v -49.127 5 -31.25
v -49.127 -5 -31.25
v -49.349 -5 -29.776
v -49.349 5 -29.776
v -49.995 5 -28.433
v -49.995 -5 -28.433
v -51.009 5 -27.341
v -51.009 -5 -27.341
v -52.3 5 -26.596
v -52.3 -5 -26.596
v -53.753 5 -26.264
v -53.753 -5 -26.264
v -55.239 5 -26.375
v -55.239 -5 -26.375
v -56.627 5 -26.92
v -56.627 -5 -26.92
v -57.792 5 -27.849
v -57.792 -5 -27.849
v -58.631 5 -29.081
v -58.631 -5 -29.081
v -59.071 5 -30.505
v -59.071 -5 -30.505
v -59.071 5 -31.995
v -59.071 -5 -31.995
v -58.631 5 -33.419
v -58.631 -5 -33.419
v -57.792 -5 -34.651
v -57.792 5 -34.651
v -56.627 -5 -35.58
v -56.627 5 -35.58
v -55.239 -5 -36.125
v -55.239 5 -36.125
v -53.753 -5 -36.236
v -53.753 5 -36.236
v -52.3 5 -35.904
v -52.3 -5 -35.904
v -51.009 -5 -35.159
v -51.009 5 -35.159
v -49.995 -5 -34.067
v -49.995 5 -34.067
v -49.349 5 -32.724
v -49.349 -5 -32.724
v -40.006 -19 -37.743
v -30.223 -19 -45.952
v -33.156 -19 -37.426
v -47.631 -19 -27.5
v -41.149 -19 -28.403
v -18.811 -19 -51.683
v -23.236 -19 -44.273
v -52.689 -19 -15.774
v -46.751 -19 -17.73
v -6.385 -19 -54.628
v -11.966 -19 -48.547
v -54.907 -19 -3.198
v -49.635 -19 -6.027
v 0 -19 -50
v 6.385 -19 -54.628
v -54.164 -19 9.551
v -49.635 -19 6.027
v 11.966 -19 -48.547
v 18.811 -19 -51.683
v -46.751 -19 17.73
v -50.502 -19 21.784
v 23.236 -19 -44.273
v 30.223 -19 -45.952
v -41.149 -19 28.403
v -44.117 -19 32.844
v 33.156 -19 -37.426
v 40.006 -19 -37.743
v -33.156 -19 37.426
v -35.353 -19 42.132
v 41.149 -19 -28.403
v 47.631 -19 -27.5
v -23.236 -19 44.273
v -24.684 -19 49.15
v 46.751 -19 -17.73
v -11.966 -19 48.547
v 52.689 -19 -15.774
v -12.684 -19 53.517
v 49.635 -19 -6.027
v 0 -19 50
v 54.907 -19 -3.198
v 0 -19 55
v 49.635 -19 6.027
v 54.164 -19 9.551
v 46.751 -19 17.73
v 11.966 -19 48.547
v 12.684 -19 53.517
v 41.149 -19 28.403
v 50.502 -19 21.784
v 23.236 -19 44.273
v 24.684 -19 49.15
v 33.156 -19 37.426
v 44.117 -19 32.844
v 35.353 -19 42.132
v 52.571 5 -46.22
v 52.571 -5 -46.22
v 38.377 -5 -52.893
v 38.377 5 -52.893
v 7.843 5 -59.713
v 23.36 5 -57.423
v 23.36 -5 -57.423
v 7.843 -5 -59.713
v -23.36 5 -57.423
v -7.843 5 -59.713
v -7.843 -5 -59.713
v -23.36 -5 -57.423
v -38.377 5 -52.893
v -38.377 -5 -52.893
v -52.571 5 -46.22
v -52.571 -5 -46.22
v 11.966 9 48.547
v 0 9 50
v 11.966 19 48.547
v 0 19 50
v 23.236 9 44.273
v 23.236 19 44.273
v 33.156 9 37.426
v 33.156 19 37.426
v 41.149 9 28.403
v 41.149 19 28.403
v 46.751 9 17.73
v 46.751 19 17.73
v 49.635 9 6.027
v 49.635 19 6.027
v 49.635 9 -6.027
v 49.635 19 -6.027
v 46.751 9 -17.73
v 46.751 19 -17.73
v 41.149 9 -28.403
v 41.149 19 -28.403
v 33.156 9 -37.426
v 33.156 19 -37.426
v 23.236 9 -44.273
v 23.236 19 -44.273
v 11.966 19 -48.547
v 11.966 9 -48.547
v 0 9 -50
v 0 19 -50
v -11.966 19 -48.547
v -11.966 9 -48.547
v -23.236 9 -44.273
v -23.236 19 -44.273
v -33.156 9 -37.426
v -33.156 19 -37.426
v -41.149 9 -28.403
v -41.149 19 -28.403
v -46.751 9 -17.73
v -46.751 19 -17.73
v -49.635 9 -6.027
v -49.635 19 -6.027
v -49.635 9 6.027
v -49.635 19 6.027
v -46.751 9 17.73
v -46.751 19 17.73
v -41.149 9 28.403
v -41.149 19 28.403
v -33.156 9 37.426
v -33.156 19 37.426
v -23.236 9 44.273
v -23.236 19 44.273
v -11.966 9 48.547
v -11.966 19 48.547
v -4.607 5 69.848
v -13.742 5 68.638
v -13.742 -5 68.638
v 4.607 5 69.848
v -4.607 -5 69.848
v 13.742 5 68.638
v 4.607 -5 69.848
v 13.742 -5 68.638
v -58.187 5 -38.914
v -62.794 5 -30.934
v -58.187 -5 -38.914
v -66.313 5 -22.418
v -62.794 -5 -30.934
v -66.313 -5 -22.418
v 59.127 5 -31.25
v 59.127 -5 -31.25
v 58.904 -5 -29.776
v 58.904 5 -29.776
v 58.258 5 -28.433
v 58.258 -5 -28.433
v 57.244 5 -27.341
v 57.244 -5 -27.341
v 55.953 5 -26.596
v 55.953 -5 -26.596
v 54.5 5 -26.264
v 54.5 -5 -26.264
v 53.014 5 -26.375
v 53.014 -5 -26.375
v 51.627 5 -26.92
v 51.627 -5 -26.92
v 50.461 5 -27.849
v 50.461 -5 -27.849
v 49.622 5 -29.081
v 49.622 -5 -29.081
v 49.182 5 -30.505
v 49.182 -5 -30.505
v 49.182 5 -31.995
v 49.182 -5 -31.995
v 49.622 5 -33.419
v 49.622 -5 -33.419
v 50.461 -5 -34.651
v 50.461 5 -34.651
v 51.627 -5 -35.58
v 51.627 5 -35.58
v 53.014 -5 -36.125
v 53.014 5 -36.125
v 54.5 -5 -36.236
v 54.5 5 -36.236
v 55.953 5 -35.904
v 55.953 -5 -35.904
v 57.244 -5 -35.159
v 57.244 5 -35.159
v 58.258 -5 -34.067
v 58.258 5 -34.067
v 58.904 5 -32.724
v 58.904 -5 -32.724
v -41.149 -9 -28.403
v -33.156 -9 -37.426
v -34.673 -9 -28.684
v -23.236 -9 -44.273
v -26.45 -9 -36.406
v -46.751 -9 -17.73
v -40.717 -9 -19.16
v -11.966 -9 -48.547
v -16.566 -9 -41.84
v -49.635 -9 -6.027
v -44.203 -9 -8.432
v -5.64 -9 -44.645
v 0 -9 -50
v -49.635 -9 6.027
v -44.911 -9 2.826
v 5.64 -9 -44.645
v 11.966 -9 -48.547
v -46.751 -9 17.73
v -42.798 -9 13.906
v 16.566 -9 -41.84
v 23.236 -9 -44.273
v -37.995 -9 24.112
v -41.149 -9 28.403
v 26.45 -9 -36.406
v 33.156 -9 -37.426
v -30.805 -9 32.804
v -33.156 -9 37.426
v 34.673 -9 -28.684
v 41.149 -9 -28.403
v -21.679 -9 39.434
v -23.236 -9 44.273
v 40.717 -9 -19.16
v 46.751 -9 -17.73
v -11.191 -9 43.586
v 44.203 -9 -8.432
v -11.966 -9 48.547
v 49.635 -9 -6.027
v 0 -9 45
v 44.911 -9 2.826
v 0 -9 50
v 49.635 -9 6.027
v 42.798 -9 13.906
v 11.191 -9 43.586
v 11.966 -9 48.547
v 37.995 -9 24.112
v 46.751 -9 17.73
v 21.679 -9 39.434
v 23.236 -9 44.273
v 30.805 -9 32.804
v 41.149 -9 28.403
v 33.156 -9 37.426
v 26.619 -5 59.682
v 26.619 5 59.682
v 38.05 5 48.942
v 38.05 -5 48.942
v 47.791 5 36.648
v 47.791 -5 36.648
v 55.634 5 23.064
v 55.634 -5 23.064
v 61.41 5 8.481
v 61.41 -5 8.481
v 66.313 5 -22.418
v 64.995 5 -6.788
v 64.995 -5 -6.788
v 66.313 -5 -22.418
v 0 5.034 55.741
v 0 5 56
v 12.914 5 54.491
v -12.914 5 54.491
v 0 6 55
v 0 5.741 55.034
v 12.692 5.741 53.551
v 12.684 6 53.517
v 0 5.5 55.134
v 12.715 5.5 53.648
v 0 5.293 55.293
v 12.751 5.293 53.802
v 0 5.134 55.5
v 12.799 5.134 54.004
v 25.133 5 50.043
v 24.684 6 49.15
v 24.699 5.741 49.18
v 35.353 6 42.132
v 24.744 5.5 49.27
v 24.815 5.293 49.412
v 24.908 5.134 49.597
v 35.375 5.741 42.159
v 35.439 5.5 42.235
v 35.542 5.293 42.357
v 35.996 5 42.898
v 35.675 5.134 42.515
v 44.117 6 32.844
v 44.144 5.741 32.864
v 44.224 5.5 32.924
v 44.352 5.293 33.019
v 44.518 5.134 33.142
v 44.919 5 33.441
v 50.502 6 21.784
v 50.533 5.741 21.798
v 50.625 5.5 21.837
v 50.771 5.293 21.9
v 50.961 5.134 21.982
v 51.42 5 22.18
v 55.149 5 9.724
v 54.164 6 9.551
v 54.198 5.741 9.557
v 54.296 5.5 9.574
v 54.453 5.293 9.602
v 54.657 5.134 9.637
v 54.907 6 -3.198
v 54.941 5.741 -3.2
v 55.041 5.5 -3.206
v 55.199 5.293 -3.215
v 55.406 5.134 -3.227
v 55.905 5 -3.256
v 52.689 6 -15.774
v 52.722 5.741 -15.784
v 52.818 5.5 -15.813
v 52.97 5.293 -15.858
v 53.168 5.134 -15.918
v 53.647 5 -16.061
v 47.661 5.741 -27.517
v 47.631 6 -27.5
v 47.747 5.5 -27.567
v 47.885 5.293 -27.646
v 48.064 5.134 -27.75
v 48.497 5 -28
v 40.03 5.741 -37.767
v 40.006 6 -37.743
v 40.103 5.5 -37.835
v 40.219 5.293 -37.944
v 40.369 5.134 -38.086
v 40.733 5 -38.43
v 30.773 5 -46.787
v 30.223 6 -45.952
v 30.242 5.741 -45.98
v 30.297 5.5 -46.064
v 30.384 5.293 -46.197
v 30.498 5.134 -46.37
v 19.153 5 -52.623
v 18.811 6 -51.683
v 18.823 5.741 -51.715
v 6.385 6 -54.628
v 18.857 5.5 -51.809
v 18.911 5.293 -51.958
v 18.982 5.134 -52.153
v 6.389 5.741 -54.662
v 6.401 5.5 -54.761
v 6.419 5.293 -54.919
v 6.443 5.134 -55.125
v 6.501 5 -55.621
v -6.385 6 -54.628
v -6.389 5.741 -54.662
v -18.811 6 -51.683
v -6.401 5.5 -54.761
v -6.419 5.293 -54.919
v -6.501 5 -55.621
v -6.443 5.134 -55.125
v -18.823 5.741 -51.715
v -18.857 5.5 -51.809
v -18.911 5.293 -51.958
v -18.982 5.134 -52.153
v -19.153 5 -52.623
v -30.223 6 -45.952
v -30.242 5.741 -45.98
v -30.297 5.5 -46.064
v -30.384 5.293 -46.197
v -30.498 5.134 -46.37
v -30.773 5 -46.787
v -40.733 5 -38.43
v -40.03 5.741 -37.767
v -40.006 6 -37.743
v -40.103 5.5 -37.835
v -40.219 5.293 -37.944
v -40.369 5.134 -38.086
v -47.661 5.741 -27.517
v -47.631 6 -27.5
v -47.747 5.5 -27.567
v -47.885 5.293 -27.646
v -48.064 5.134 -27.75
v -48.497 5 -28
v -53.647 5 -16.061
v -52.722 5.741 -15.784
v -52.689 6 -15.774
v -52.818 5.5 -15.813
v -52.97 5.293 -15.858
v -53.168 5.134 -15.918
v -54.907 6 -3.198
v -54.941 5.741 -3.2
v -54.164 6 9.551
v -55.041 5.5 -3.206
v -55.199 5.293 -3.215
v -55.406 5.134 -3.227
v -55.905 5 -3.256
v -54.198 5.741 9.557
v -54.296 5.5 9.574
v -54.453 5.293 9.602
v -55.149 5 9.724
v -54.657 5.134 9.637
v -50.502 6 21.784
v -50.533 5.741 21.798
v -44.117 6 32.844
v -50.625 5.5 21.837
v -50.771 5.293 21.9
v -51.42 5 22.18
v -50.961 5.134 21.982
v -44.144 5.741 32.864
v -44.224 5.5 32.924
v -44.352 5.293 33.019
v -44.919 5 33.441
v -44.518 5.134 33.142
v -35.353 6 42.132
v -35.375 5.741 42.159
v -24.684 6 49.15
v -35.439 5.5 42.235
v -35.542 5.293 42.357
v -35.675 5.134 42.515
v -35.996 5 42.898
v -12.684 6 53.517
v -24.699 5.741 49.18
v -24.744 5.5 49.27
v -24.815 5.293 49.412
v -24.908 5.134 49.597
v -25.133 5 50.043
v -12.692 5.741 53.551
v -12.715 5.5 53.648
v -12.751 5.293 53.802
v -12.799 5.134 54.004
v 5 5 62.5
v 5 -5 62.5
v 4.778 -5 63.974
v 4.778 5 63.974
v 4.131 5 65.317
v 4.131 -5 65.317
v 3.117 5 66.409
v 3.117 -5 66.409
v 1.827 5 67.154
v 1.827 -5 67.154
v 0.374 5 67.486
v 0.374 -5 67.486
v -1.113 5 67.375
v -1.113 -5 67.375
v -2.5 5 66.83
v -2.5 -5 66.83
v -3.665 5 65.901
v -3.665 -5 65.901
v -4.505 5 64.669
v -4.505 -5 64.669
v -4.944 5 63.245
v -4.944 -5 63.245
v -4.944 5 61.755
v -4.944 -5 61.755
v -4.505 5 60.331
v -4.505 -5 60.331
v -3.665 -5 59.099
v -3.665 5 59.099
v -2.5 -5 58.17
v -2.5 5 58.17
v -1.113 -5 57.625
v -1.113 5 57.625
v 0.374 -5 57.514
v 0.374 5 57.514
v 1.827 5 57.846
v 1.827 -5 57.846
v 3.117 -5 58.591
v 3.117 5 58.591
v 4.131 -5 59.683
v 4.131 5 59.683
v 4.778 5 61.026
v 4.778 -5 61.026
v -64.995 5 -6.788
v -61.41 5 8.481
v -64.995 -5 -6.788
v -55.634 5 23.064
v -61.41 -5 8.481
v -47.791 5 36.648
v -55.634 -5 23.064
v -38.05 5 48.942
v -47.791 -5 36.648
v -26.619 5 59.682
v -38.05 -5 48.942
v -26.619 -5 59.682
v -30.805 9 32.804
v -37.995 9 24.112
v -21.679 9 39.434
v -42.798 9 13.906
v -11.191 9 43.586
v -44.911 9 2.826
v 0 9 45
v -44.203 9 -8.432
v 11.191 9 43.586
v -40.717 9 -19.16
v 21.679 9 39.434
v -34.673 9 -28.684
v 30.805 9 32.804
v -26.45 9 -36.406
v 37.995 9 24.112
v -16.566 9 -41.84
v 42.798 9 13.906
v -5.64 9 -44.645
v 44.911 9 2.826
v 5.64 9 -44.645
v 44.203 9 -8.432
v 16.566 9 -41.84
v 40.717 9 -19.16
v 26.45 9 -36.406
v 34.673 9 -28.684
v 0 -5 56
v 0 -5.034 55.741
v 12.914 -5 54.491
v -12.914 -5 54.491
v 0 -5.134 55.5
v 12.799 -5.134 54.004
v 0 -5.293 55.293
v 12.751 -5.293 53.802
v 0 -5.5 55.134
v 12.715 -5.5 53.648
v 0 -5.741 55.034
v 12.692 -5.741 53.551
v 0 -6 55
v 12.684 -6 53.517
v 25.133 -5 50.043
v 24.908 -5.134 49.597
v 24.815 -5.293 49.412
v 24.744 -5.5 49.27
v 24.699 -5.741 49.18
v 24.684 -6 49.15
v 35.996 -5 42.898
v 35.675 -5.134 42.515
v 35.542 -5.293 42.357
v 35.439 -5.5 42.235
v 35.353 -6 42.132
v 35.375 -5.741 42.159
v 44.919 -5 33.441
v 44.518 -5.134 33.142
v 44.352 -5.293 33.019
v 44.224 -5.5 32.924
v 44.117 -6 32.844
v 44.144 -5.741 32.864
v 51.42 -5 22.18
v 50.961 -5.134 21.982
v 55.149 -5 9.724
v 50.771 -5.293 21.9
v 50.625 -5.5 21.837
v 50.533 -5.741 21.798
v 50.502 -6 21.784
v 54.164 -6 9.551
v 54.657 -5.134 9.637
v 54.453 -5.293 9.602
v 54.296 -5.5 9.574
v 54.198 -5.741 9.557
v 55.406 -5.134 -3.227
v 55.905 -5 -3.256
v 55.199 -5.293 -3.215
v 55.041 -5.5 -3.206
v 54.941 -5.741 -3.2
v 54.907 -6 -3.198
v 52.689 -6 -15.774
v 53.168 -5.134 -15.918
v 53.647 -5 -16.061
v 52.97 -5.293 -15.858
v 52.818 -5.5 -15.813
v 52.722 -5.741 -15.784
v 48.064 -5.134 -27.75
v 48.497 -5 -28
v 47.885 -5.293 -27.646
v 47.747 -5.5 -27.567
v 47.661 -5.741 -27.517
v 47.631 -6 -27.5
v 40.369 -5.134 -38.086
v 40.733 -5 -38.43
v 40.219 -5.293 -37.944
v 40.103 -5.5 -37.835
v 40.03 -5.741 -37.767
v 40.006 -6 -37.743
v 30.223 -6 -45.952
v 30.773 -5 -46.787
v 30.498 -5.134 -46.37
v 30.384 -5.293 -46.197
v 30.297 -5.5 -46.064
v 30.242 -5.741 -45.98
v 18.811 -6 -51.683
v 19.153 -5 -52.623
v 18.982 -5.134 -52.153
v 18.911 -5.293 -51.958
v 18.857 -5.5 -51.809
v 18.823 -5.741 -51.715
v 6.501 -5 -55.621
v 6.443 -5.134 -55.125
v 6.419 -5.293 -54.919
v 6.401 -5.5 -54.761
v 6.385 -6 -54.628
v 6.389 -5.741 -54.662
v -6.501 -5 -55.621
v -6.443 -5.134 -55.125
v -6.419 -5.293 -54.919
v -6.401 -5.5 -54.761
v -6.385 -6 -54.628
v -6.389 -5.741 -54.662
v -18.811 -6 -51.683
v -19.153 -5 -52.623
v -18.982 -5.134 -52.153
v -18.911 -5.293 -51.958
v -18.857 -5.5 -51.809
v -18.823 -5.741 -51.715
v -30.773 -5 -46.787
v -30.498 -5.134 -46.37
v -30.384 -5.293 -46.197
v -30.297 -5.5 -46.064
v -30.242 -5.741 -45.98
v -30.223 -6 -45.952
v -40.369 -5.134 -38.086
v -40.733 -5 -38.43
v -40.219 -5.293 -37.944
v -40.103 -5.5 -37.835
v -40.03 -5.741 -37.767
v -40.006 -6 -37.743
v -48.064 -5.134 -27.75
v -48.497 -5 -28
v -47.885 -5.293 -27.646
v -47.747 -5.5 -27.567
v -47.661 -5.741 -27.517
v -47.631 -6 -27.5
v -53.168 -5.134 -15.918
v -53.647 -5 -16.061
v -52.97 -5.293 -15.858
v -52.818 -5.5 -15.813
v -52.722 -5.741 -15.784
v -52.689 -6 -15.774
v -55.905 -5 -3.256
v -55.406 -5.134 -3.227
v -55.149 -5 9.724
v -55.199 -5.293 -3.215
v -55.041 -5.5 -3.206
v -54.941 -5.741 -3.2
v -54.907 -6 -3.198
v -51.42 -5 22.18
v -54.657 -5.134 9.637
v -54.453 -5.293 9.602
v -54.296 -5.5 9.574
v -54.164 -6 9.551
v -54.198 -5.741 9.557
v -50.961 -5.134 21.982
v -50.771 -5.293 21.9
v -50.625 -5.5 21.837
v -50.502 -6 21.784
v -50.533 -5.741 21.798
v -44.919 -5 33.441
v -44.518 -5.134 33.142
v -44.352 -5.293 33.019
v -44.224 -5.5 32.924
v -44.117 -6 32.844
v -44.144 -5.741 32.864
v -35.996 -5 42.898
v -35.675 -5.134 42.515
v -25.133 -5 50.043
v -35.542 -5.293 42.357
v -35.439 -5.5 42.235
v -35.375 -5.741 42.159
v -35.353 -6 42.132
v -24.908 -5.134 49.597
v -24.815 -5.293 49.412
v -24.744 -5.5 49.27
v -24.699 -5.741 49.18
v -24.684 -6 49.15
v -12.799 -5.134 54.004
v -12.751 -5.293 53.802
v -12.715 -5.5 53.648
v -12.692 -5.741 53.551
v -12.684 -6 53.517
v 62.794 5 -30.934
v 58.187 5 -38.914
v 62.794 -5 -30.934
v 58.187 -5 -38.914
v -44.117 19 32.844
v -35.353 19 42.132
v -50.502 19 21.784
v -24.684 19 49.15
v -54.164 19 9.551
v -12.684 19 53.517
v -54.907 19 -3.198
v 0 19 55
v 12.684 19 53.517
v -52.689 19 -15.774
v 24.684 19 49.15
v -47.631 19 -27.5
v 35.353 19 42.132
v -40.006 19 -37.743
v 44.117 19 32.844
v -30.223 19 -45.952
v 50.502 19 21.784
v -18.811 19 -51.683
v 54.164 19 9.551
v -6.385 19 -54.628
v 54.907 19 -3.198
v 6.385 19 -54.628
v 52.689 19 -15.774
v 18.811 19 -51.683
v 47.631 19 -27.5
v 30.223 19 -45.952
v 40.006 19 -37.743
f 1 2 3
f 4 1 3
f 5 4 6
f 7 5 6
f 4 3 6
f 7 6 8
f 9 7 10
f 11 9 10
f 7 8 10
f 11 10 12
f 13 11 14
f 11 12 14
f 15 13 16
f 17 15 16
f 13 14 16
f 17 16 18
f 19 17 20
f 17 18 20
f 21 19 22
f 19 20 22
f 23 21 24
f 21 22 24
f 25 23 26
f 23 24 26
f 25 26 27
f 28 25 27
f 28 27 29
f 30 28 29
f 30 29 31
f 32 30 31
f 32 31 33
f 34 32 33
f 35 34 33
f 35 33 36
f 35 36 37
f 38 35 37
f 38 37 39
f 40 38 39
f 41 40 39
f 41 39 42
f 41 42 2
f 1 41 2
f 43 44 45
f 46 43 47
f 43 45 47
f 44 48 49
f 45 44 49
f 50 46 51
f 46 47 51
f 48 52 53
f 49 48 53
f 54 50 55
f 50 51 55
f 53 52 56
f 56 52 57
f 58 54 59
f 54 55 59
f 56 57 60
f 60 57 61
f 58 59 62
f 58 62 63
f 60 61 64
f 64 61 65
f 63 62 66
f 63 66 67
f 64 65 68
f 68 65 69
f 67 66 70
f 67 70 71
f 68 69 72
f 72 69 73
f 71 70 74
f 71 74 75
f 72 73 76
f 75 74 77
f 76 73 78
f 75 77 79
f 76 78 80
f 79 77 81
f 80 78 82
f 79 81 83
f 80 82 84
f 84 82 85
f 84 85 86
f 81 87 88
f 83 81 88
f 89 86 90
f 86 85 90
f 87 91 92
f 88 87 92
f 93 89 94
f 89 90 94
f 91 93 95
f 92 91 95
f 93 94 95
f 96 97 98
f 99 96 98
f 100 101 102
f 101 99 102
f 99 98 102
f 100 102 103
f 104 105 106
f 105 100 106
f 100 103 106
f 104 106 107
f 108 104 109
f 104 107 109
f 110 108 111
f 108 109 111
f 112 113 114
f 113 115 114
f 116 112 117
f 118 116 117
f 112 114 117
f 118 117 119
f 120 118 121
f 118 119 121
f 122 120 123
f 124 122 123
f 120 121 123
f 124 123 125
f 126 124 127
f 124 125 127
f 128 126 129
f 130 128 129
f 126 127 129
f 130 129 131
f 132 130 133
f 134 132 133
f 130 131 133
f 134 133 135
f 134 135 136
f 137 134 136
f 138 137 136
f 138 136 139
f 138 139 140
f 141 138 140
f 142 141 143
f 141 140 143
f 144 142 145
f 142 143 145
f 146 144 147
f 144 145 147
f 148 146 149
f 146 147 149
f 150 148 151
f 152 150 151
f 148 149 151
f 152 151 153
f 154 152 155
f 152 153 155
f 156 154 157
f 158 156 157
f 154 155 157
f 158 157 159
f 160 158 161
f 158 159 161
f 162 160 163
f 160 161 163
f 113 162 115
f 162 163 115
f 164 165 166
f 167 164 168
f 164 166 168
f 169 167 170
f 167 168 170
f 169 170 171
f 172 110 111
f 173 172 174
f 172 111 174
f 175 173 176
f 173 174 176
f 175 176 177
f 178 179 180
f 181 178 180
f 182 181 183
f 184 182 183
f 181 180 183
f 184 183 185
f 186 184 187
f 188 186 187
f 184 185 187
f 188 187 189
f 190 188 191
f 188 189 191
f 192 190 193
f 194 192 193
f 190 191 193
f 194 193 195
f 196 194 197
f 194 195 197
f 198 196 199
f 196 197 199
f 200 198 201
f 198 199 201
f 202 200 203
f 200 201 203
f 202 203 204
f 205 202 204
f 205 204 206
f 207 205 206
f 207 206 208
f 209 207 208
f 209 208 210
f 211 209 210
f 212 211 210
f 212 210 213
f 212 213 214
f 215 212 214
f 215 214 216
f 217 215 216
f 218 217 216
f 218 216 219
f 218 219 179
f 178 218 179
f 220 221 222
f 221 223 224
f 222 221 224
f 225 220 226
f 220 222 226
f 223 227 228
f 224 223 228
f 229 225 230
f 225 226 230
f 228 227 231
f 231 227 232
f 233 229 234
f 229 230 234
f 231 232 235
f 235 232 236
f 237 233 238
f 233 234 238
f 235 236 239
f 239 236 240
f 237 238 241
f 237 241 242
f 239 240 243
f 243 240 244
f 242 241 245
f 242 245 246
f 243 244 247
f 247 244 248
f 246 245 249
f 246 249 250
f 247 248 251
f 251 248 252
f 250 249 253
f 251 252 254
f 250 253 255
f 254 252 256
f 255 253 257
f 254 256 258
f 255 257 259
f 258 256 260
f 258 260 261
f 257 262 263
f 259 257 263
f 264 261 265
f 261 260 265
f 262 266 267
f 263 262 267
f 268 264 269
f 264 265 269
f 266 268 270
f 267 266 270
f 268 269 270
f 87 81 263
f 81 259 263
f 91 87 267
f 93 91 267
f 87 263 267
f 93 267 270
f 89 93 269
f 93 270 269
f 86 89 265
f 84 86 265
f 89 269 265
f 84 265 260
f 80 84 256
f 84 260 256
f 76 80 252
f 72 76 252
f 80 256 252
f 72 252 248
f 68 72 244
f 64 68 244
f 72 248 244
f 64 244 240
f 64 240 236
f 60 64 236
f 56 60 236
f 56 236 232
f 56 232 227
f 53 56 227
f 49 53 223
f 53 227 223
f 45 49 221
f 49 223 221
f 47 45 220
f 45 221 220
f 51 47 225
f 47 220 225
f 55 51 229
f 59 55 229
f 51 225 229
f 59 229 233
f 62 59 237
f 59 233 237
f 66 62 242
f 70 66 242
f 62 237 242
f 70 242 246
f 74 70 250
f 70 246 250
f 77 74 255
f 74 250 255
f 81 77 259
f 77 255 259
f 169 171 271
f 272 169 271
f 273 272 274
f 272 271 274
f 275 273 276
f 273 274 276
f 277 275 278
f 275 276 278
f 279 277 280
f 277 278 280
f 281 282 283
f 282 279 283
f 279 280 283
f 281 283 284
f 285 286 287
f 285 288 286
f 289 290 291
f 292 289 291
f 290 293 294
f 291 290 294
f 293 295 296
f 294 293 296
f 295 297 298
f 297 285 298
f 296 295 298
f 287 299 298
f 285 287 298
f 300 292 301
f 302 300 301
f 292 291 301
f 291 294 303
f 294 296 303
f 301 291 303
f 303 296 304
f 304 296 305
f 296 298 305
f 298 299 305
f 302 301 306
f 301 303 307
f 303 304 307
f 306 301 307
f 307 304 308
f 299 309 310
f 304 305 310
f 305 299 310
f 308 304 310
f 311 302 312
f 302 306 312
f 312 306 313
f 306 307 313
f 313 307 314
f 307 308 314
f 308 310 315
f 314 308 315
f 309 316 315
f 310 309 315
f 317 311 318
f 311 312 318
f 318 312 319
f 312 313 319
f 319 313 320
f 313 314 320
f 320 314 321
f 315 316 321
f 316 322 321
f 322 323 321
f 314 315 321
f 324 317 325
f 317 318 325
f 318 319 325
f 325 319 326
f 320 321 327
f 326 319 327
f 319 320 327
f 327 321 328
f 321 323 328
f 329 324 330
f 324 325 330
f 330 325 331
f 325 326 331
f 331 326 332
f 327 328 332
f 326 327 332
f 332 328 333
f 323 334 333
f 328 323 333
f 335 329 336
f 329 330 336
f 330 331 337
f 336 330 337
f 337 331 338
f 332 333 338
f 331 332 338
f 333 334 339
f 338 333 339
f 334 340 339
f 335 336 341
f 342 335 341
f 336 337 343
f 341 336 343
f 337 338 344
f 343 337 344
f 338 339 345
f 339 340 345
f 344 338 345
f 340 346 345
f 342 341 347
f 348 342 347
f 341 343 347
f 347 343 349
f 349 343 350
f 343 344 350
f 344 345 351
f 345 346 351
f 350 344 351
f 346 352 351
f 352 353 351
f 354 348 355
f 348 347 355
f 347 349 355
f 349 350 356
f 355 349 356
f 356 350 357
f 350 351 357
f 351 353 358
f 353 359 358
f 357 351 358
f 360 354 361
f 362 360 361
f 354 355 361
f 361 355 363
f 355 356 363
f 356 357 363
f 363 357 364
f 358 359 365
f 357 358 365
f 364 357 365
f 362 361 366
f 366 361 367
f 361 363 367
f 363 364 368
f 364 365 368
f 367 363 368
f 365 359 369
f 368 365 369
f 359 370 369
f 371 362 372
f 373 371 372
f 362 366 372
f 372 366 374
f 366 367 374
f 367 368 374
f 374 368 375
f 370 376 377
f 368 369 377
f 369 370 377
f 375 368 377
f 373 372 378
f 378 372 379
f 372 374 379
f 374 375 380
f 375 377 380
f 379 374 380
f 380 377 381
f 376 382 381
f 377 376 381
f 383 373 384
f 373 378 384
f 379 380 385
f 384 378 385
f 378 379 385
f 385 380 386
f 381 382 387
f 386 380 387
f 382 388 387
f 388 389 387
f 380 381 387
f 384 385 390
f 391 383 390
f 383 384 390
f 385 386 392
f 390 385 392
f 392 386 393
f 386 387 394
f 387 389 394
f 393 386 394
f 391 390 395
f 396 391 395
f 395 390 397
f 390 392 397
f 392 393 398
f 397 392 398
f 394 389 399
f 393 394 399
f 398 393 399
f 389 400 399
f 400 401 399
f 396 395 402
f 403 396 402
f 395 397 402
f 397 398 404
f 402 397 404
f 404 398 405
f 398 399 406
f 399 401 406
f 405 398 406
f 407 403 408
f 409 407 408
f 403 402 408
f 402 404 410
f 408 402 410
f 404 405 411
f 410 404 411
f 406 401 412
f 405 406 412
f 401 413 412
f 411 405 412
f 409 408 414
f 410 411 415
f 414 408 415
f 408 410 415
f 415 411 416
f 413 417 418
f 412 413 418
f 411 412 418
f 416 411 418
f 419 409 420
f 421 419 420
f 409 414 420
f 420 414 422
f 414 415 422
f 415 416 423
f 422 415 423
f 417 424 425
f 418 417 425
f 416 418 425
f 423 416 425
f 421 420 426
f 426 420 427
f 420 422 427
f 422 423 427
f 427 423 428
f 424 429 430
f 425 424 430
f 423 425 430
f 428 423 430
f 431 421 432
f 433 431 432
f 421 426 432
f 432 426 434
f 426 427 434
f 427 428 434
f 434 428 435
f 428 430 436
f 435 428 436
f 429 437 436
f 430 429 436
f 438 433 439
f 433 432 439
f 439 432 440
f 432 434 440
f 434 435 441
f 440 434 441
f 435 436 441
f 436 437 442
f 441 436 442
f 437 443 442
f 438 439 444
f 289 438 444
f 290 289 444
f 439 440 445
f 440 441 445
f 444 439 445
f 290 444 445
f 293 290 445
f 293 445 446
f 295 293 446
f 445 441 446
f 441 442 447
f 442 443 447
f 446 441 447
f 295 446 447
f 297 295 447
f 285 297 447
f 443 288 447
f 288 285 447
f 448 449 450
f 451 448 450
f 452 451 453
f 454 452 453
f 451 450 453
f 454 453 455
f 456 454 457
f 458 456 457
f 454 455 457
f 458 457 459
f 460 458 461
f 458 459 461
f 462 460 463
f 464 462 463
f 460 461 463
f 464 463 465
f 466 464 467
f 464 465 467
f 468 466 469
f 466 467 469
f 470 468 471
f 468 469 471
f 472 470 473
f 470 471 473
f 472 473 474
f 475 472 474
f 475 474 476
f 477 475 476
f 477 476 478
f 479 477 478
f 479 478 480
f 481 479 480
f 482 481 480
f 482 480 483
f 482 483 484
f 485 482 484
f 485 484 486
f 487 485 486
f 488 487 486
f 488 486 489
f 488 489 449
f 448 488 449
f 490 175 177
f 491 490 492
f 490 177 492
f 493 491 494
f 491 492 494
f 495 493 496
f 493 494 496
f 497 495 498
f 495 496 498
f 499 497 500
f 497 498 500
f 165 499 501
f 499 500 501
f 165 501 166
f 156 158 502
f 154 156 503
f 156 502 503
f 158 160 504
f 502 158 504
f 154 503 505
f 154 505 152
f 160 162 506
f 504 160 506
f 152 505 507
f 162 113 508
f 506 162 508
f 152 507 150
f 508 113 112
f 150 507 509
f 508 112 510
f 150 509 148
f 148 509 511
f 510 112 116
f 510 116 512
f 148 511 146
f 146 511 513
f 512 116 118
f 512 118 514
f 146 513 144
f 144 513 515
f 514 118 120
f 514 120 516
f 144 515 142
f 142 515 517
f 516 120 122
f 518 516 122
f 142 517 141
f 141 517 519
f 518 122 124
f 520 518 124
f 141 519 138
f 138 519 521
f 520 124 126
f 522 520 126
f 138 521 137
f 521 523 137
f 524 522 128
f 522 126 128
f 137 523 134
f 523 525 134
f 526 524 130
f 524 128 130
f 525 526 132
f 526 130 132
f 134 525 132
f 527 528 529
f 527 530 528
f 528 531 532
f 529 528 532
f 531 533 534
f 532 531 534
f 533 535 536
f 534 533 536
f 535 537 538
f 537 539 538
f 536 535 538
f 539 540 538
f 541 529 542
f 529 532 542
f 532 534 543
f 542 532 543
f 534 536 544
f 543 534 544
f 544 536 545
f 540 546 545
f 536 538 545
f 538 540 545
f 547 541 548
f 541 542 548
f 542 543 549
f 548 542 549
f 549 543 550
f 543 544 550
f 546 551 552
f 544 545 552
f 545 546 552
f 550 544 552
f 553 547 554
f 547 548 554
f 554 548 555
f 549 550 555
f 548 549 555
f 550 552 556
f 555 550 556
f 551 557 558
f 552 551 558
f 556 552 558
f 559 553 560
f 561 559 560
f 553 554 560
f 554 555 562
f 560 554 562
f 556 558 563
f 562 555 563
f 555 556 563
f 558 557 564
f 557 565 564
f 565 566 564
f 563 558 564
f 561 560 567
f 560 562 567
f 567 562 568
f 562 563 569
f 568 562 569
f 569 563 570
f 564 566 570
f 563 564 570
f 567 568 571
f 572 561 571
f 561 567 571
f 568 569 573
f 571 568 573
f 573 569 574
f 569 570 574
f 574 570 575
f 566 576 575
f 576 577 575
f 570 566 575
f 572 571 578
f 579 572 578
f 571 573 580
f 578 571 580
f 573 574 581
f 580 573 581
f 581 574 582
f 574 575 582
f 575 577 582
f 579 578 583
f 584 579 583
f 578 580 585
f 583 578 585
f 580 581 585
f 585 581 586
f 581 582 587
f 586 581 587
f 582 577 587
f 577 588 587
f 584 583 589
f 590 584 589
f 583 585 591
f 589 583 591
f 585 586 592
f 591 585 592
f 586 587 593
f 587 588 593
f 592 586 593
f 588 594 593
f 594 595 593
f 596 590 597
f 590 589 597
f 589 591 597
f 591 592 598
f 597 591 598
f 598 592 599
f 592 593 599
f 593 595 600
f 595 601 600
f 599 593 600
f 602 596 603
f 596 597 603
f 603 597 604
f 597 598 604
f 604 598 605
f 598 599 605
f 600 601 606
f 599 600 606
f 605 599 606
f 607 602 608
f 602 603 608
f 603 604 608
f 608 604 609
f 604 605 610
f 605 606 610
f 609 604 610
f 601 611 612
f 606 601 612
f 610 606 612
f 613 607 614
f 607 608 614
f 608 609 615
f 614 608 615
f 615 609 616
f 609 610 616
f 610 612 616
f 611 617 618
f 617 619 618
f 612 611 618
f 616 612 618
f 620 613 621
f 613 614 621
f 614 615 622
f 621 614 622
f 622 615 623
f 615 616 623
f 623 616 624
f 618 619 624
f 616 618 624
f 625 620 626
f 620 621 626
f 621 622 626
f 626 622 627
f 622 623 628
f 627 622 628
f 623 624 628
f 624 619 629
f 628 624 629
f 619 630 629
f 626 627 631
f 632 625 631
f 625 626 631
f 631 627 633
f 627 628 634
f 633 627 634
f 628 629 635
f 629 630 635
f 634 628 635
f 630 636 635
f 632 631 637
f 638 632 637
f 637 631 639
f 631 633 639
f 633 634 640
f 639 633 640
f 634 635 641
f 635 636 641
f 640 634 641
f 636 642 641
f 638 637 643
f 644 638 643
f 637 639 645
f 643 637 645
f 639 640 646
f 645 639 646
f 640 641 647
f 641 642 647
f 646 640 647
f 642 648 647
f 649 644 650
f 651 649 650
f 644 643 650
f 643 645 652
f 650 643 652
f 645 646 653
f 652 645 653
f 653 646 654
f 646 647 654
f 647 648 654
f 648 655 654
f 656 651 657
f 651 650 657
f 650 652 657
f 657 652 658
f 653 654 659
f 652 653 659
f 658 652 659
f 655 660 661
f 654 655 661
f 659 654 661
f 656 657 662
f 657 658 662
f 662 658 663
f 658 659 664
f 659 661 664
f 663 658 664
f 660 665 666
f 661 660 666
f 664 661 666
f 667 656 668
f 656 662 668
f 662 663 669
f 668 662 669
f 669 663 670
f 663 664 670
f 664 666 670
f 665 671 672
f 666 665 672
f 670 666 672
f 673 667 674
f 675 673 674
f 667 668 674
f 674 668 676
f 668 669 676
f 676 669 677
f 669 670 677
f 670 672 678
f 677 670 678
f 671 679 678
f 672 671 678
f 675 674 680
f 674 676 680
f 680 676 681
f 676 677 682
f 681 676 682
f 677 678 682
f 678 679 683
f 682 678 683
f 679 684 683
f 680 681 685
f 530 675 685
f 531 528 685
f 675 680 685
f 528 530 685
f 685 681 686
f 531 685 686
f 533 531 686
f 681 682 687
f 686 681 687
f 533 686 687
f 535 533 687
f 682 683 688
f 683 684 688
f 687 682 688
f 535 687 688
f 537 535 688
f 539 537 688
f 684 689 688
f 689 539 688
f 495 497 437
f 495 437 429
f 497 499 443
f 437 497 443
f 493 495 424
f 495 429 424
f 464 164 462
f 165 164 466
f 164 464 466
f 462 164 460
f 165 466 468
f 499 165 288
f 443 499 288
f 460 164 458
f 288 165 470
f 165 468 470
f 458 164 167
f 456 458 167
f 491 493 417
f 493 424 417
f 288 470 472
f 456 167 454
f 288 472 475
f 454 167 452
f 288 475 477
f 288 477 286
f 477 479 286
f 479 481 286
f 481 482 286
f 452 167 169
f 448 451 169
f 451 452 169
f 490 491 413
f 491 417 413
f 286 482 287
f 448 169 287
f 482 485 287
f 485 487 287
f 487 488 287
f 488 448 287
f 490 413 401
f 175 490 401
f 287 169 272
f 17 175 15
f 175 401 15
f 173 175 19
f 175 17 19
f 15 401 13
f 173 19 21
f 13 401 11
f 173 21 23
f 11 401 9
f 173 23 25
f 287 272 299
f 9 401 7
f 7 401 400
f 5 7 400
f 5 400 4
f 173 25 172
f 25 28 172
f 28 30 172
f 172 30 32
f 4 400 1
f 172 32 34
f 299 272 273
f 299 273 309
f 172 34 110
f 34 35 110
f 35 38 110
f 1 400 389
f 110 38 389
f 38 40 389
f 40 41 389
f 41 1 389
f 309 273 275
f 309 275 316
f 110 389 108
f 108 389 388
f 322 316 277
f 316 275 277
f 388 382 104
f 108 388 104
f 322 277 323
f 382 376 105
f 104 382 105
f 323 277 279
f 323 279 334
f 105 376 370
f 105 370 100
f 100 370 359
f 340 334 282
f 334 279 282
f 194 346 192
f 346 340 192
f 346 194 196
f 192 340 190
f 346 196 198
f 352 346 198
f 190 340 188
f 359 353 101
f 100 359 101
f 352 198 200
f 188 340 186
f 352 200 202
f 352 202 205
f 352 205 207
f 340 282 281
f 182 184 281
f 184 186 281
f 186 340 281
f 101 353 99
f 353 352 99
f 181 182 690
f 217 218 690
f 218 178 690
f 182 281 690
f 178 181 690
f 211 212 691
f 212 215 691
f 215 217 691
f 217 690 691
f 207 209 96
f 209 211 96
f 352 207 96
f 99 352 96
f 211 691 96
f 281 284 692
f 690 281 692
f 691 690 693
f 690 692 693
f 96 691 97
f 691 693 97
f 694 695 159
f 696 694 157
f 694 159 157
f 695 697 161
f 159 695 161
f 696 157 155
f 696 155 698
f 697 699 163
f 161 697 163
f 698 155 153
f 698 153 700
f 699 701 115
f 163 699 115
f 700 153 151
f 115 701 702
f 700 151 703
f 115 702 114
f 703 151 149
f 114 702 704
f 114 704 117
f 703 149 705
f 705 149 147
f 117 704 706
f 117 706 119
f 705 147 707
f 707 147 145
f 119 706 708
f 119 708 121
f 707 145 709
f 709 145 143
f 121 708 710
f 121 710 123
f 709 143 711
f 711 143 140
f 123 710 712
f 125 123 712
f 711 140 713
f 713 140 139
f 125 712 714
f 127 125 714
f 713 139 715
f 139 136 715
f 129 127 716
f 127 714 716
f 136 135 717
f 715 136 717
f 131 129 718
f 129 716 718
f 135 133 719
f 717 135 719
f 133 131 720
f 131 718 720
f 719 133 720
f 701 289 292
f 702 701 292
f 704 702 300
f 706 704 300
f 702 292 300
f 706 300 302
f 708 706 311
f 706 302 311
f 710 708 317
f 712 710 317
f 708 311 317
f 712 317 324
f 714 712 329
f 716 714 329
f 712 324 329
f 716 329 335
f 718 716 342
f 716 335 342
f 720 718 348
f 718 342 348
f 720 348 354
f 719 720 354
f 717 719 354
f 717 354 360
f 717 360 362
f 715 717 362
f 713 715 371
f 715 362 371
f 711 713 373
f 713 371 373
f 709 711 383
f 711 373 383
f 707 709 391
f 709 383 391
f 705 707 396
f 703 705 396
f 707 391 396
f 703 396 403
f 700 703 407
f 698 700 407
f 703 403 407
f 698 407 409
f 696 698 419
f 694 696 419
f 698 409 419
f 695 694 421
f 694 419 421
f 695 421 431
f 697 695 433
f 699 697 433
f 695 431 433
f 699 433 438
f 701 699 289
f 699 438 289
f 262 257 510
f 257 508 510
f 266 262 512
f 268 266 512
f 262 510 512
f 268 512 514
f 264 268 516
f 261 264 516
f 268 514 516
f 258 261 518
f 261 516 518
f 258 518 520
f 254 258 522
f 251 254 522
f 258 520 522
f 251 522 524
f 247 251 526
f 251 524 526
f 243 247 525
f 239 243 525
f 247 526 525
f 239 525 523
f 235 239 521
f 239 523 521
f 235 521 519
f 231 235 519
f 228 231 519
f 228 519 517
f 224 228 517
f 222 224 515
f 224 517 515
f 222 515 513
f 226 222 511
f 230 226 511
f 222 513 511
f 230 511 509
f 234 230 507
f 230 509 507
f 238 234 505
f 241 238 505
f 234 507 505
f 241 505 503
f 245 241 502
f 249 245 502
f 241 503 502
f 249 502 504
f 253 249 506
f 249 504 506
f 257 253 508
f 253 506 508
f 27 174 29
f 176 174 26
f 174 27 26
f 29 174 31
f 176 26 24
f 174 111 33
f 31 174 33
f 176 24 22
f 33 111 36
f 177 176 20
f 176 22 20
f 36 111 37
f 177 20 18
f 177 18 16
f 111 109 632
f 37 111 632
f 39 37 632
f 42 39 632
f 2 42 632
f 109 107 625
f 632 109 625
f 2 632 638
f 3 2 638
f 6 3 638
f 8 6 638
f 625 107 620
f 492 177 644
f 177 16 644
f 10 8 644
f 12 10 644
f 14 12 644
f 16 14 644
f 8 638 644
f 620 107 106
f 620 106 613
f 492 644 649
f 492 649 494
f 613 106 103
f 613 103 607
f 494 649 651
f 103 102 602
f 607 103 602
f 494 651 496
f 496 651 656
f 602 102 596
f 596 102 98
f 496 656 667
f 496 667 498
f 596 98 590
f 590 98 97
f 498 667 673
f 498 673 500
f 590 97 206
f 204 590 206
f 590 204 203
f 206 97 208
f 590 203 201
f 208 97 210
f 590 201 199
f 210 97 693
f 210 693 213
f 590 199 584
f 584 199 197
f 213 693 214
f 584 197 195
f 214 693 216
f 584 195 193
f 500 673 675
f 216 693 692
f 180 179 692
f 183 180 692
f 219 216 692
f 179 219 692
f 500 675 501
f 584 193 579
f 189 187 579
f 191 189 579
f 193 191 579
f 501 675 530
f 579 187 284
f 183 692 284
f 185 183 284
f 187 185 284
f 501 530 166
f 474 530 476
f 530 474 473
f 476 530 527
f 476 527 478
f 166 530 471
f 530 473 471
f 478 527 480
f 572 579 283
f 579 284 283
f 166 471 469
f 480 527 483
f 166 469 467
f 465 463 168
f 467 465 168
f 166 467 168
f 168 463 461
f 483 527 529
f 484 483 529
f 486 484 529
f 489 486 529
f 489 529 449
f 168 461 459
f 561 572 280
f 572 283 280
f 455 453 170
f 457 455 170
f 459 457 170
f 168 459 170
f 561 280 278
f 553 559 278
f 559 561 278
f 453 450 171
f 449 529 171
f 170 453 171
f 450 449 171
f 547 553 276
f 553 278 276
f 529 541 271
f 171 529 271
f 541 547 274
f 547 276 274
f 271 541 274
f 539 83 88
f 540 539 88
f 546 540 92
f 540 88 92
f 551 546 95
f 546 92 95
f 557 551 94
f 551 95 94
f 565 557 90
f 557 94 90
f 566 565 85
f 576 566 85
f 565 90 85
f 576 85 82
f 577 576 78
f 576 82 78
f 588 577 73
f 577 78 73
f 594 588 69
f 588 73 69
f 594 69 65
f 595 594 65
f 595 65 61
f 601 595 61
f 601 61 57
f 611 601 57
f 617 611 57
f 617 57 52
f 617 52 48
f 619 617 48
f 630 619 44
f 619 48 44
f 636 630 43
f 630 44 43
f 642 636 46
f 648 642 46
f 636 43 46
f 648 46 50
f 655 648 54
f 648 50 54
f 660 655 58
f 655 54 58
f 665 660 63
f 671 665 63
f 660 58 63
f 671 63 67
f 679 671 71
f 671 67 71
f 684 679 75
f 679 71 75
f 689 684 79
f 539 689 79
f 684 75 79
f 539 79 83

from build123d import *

# Parameters (mm, degrees)
F2_R     = 5
F3_DEPTH = 24.001
F4_R     = 81.962232
F5_DEPTH = 24.001
F6_R     = 1


with BuildPart() as f1:
    # F0 (on Right) → F1 (revolve)
    with BuildSketch(Plane.YZ):
        Polygon((-19, 55), (-19, 50), (-9, 50), (-9, 45), (9, 45), (9, 50), (19, 50), (19, 55), (5, 55), (5, 70), (-5, 70), (-5, 55), align=None)
    revolve(axis=Axis((0, 0.467166, 0), (0, 1, 0)))

    # F2 (on face) → F3 (cut, through all)
    with BuildSketch(Plane.XZ.offset(5)):
        with Locations((0, 62.5)):
            Circle(F2_R)
        with Locations((-54.126588, -31.25)):
            Circle(F2_R)
        with Locations((54.126588, -31.25)):
            Circle(F2_R)
    extrude(amount=-F3_DEPTH, mode=Mode.SUBTRACT)

    # F4 (on face) → F5 (cut, through all)
    with BuildSketch(Plane.XZ.offset(5)):
        Circle(F4_R)
        with BuildLine():
            ThreePointArc((-13.741895, 68.637893), (0, 70), (13.741895, 68.637893))
            ThreePointArc((13.741895, 68.637893), (51.961524, 30), (66.313106, -22.418116))
            ThreePointArc((66.313106, -22.418116), (60.621778, -35), (52.571211, -46.219777))
            ThreePointArc((52.571211, -46.219777), (0, -60), (-52.571211, -46.219777))
            ThreePointArc((-52.571211, -46.219777), (-60.621778, -35), (-66.313106, -22.418116))
            ThreePointArc((-66.313106, -22.418116), (-51.961524, 30), (-13.741895, 68.637893))
        make_face(mode=Mode.SUBTRACT)
    extrude(amount=-F5_DEPTH, mode=Mode.SUBTRACT)

    # F6
    f6_edges = [f1.edges().sort_by_distance(p)[0] for p in [
        (0, -5, -55),
        (0, 5, -55),
    ]]
    fillet(f6_edges, radius=F6_R)


solid = f1.part
